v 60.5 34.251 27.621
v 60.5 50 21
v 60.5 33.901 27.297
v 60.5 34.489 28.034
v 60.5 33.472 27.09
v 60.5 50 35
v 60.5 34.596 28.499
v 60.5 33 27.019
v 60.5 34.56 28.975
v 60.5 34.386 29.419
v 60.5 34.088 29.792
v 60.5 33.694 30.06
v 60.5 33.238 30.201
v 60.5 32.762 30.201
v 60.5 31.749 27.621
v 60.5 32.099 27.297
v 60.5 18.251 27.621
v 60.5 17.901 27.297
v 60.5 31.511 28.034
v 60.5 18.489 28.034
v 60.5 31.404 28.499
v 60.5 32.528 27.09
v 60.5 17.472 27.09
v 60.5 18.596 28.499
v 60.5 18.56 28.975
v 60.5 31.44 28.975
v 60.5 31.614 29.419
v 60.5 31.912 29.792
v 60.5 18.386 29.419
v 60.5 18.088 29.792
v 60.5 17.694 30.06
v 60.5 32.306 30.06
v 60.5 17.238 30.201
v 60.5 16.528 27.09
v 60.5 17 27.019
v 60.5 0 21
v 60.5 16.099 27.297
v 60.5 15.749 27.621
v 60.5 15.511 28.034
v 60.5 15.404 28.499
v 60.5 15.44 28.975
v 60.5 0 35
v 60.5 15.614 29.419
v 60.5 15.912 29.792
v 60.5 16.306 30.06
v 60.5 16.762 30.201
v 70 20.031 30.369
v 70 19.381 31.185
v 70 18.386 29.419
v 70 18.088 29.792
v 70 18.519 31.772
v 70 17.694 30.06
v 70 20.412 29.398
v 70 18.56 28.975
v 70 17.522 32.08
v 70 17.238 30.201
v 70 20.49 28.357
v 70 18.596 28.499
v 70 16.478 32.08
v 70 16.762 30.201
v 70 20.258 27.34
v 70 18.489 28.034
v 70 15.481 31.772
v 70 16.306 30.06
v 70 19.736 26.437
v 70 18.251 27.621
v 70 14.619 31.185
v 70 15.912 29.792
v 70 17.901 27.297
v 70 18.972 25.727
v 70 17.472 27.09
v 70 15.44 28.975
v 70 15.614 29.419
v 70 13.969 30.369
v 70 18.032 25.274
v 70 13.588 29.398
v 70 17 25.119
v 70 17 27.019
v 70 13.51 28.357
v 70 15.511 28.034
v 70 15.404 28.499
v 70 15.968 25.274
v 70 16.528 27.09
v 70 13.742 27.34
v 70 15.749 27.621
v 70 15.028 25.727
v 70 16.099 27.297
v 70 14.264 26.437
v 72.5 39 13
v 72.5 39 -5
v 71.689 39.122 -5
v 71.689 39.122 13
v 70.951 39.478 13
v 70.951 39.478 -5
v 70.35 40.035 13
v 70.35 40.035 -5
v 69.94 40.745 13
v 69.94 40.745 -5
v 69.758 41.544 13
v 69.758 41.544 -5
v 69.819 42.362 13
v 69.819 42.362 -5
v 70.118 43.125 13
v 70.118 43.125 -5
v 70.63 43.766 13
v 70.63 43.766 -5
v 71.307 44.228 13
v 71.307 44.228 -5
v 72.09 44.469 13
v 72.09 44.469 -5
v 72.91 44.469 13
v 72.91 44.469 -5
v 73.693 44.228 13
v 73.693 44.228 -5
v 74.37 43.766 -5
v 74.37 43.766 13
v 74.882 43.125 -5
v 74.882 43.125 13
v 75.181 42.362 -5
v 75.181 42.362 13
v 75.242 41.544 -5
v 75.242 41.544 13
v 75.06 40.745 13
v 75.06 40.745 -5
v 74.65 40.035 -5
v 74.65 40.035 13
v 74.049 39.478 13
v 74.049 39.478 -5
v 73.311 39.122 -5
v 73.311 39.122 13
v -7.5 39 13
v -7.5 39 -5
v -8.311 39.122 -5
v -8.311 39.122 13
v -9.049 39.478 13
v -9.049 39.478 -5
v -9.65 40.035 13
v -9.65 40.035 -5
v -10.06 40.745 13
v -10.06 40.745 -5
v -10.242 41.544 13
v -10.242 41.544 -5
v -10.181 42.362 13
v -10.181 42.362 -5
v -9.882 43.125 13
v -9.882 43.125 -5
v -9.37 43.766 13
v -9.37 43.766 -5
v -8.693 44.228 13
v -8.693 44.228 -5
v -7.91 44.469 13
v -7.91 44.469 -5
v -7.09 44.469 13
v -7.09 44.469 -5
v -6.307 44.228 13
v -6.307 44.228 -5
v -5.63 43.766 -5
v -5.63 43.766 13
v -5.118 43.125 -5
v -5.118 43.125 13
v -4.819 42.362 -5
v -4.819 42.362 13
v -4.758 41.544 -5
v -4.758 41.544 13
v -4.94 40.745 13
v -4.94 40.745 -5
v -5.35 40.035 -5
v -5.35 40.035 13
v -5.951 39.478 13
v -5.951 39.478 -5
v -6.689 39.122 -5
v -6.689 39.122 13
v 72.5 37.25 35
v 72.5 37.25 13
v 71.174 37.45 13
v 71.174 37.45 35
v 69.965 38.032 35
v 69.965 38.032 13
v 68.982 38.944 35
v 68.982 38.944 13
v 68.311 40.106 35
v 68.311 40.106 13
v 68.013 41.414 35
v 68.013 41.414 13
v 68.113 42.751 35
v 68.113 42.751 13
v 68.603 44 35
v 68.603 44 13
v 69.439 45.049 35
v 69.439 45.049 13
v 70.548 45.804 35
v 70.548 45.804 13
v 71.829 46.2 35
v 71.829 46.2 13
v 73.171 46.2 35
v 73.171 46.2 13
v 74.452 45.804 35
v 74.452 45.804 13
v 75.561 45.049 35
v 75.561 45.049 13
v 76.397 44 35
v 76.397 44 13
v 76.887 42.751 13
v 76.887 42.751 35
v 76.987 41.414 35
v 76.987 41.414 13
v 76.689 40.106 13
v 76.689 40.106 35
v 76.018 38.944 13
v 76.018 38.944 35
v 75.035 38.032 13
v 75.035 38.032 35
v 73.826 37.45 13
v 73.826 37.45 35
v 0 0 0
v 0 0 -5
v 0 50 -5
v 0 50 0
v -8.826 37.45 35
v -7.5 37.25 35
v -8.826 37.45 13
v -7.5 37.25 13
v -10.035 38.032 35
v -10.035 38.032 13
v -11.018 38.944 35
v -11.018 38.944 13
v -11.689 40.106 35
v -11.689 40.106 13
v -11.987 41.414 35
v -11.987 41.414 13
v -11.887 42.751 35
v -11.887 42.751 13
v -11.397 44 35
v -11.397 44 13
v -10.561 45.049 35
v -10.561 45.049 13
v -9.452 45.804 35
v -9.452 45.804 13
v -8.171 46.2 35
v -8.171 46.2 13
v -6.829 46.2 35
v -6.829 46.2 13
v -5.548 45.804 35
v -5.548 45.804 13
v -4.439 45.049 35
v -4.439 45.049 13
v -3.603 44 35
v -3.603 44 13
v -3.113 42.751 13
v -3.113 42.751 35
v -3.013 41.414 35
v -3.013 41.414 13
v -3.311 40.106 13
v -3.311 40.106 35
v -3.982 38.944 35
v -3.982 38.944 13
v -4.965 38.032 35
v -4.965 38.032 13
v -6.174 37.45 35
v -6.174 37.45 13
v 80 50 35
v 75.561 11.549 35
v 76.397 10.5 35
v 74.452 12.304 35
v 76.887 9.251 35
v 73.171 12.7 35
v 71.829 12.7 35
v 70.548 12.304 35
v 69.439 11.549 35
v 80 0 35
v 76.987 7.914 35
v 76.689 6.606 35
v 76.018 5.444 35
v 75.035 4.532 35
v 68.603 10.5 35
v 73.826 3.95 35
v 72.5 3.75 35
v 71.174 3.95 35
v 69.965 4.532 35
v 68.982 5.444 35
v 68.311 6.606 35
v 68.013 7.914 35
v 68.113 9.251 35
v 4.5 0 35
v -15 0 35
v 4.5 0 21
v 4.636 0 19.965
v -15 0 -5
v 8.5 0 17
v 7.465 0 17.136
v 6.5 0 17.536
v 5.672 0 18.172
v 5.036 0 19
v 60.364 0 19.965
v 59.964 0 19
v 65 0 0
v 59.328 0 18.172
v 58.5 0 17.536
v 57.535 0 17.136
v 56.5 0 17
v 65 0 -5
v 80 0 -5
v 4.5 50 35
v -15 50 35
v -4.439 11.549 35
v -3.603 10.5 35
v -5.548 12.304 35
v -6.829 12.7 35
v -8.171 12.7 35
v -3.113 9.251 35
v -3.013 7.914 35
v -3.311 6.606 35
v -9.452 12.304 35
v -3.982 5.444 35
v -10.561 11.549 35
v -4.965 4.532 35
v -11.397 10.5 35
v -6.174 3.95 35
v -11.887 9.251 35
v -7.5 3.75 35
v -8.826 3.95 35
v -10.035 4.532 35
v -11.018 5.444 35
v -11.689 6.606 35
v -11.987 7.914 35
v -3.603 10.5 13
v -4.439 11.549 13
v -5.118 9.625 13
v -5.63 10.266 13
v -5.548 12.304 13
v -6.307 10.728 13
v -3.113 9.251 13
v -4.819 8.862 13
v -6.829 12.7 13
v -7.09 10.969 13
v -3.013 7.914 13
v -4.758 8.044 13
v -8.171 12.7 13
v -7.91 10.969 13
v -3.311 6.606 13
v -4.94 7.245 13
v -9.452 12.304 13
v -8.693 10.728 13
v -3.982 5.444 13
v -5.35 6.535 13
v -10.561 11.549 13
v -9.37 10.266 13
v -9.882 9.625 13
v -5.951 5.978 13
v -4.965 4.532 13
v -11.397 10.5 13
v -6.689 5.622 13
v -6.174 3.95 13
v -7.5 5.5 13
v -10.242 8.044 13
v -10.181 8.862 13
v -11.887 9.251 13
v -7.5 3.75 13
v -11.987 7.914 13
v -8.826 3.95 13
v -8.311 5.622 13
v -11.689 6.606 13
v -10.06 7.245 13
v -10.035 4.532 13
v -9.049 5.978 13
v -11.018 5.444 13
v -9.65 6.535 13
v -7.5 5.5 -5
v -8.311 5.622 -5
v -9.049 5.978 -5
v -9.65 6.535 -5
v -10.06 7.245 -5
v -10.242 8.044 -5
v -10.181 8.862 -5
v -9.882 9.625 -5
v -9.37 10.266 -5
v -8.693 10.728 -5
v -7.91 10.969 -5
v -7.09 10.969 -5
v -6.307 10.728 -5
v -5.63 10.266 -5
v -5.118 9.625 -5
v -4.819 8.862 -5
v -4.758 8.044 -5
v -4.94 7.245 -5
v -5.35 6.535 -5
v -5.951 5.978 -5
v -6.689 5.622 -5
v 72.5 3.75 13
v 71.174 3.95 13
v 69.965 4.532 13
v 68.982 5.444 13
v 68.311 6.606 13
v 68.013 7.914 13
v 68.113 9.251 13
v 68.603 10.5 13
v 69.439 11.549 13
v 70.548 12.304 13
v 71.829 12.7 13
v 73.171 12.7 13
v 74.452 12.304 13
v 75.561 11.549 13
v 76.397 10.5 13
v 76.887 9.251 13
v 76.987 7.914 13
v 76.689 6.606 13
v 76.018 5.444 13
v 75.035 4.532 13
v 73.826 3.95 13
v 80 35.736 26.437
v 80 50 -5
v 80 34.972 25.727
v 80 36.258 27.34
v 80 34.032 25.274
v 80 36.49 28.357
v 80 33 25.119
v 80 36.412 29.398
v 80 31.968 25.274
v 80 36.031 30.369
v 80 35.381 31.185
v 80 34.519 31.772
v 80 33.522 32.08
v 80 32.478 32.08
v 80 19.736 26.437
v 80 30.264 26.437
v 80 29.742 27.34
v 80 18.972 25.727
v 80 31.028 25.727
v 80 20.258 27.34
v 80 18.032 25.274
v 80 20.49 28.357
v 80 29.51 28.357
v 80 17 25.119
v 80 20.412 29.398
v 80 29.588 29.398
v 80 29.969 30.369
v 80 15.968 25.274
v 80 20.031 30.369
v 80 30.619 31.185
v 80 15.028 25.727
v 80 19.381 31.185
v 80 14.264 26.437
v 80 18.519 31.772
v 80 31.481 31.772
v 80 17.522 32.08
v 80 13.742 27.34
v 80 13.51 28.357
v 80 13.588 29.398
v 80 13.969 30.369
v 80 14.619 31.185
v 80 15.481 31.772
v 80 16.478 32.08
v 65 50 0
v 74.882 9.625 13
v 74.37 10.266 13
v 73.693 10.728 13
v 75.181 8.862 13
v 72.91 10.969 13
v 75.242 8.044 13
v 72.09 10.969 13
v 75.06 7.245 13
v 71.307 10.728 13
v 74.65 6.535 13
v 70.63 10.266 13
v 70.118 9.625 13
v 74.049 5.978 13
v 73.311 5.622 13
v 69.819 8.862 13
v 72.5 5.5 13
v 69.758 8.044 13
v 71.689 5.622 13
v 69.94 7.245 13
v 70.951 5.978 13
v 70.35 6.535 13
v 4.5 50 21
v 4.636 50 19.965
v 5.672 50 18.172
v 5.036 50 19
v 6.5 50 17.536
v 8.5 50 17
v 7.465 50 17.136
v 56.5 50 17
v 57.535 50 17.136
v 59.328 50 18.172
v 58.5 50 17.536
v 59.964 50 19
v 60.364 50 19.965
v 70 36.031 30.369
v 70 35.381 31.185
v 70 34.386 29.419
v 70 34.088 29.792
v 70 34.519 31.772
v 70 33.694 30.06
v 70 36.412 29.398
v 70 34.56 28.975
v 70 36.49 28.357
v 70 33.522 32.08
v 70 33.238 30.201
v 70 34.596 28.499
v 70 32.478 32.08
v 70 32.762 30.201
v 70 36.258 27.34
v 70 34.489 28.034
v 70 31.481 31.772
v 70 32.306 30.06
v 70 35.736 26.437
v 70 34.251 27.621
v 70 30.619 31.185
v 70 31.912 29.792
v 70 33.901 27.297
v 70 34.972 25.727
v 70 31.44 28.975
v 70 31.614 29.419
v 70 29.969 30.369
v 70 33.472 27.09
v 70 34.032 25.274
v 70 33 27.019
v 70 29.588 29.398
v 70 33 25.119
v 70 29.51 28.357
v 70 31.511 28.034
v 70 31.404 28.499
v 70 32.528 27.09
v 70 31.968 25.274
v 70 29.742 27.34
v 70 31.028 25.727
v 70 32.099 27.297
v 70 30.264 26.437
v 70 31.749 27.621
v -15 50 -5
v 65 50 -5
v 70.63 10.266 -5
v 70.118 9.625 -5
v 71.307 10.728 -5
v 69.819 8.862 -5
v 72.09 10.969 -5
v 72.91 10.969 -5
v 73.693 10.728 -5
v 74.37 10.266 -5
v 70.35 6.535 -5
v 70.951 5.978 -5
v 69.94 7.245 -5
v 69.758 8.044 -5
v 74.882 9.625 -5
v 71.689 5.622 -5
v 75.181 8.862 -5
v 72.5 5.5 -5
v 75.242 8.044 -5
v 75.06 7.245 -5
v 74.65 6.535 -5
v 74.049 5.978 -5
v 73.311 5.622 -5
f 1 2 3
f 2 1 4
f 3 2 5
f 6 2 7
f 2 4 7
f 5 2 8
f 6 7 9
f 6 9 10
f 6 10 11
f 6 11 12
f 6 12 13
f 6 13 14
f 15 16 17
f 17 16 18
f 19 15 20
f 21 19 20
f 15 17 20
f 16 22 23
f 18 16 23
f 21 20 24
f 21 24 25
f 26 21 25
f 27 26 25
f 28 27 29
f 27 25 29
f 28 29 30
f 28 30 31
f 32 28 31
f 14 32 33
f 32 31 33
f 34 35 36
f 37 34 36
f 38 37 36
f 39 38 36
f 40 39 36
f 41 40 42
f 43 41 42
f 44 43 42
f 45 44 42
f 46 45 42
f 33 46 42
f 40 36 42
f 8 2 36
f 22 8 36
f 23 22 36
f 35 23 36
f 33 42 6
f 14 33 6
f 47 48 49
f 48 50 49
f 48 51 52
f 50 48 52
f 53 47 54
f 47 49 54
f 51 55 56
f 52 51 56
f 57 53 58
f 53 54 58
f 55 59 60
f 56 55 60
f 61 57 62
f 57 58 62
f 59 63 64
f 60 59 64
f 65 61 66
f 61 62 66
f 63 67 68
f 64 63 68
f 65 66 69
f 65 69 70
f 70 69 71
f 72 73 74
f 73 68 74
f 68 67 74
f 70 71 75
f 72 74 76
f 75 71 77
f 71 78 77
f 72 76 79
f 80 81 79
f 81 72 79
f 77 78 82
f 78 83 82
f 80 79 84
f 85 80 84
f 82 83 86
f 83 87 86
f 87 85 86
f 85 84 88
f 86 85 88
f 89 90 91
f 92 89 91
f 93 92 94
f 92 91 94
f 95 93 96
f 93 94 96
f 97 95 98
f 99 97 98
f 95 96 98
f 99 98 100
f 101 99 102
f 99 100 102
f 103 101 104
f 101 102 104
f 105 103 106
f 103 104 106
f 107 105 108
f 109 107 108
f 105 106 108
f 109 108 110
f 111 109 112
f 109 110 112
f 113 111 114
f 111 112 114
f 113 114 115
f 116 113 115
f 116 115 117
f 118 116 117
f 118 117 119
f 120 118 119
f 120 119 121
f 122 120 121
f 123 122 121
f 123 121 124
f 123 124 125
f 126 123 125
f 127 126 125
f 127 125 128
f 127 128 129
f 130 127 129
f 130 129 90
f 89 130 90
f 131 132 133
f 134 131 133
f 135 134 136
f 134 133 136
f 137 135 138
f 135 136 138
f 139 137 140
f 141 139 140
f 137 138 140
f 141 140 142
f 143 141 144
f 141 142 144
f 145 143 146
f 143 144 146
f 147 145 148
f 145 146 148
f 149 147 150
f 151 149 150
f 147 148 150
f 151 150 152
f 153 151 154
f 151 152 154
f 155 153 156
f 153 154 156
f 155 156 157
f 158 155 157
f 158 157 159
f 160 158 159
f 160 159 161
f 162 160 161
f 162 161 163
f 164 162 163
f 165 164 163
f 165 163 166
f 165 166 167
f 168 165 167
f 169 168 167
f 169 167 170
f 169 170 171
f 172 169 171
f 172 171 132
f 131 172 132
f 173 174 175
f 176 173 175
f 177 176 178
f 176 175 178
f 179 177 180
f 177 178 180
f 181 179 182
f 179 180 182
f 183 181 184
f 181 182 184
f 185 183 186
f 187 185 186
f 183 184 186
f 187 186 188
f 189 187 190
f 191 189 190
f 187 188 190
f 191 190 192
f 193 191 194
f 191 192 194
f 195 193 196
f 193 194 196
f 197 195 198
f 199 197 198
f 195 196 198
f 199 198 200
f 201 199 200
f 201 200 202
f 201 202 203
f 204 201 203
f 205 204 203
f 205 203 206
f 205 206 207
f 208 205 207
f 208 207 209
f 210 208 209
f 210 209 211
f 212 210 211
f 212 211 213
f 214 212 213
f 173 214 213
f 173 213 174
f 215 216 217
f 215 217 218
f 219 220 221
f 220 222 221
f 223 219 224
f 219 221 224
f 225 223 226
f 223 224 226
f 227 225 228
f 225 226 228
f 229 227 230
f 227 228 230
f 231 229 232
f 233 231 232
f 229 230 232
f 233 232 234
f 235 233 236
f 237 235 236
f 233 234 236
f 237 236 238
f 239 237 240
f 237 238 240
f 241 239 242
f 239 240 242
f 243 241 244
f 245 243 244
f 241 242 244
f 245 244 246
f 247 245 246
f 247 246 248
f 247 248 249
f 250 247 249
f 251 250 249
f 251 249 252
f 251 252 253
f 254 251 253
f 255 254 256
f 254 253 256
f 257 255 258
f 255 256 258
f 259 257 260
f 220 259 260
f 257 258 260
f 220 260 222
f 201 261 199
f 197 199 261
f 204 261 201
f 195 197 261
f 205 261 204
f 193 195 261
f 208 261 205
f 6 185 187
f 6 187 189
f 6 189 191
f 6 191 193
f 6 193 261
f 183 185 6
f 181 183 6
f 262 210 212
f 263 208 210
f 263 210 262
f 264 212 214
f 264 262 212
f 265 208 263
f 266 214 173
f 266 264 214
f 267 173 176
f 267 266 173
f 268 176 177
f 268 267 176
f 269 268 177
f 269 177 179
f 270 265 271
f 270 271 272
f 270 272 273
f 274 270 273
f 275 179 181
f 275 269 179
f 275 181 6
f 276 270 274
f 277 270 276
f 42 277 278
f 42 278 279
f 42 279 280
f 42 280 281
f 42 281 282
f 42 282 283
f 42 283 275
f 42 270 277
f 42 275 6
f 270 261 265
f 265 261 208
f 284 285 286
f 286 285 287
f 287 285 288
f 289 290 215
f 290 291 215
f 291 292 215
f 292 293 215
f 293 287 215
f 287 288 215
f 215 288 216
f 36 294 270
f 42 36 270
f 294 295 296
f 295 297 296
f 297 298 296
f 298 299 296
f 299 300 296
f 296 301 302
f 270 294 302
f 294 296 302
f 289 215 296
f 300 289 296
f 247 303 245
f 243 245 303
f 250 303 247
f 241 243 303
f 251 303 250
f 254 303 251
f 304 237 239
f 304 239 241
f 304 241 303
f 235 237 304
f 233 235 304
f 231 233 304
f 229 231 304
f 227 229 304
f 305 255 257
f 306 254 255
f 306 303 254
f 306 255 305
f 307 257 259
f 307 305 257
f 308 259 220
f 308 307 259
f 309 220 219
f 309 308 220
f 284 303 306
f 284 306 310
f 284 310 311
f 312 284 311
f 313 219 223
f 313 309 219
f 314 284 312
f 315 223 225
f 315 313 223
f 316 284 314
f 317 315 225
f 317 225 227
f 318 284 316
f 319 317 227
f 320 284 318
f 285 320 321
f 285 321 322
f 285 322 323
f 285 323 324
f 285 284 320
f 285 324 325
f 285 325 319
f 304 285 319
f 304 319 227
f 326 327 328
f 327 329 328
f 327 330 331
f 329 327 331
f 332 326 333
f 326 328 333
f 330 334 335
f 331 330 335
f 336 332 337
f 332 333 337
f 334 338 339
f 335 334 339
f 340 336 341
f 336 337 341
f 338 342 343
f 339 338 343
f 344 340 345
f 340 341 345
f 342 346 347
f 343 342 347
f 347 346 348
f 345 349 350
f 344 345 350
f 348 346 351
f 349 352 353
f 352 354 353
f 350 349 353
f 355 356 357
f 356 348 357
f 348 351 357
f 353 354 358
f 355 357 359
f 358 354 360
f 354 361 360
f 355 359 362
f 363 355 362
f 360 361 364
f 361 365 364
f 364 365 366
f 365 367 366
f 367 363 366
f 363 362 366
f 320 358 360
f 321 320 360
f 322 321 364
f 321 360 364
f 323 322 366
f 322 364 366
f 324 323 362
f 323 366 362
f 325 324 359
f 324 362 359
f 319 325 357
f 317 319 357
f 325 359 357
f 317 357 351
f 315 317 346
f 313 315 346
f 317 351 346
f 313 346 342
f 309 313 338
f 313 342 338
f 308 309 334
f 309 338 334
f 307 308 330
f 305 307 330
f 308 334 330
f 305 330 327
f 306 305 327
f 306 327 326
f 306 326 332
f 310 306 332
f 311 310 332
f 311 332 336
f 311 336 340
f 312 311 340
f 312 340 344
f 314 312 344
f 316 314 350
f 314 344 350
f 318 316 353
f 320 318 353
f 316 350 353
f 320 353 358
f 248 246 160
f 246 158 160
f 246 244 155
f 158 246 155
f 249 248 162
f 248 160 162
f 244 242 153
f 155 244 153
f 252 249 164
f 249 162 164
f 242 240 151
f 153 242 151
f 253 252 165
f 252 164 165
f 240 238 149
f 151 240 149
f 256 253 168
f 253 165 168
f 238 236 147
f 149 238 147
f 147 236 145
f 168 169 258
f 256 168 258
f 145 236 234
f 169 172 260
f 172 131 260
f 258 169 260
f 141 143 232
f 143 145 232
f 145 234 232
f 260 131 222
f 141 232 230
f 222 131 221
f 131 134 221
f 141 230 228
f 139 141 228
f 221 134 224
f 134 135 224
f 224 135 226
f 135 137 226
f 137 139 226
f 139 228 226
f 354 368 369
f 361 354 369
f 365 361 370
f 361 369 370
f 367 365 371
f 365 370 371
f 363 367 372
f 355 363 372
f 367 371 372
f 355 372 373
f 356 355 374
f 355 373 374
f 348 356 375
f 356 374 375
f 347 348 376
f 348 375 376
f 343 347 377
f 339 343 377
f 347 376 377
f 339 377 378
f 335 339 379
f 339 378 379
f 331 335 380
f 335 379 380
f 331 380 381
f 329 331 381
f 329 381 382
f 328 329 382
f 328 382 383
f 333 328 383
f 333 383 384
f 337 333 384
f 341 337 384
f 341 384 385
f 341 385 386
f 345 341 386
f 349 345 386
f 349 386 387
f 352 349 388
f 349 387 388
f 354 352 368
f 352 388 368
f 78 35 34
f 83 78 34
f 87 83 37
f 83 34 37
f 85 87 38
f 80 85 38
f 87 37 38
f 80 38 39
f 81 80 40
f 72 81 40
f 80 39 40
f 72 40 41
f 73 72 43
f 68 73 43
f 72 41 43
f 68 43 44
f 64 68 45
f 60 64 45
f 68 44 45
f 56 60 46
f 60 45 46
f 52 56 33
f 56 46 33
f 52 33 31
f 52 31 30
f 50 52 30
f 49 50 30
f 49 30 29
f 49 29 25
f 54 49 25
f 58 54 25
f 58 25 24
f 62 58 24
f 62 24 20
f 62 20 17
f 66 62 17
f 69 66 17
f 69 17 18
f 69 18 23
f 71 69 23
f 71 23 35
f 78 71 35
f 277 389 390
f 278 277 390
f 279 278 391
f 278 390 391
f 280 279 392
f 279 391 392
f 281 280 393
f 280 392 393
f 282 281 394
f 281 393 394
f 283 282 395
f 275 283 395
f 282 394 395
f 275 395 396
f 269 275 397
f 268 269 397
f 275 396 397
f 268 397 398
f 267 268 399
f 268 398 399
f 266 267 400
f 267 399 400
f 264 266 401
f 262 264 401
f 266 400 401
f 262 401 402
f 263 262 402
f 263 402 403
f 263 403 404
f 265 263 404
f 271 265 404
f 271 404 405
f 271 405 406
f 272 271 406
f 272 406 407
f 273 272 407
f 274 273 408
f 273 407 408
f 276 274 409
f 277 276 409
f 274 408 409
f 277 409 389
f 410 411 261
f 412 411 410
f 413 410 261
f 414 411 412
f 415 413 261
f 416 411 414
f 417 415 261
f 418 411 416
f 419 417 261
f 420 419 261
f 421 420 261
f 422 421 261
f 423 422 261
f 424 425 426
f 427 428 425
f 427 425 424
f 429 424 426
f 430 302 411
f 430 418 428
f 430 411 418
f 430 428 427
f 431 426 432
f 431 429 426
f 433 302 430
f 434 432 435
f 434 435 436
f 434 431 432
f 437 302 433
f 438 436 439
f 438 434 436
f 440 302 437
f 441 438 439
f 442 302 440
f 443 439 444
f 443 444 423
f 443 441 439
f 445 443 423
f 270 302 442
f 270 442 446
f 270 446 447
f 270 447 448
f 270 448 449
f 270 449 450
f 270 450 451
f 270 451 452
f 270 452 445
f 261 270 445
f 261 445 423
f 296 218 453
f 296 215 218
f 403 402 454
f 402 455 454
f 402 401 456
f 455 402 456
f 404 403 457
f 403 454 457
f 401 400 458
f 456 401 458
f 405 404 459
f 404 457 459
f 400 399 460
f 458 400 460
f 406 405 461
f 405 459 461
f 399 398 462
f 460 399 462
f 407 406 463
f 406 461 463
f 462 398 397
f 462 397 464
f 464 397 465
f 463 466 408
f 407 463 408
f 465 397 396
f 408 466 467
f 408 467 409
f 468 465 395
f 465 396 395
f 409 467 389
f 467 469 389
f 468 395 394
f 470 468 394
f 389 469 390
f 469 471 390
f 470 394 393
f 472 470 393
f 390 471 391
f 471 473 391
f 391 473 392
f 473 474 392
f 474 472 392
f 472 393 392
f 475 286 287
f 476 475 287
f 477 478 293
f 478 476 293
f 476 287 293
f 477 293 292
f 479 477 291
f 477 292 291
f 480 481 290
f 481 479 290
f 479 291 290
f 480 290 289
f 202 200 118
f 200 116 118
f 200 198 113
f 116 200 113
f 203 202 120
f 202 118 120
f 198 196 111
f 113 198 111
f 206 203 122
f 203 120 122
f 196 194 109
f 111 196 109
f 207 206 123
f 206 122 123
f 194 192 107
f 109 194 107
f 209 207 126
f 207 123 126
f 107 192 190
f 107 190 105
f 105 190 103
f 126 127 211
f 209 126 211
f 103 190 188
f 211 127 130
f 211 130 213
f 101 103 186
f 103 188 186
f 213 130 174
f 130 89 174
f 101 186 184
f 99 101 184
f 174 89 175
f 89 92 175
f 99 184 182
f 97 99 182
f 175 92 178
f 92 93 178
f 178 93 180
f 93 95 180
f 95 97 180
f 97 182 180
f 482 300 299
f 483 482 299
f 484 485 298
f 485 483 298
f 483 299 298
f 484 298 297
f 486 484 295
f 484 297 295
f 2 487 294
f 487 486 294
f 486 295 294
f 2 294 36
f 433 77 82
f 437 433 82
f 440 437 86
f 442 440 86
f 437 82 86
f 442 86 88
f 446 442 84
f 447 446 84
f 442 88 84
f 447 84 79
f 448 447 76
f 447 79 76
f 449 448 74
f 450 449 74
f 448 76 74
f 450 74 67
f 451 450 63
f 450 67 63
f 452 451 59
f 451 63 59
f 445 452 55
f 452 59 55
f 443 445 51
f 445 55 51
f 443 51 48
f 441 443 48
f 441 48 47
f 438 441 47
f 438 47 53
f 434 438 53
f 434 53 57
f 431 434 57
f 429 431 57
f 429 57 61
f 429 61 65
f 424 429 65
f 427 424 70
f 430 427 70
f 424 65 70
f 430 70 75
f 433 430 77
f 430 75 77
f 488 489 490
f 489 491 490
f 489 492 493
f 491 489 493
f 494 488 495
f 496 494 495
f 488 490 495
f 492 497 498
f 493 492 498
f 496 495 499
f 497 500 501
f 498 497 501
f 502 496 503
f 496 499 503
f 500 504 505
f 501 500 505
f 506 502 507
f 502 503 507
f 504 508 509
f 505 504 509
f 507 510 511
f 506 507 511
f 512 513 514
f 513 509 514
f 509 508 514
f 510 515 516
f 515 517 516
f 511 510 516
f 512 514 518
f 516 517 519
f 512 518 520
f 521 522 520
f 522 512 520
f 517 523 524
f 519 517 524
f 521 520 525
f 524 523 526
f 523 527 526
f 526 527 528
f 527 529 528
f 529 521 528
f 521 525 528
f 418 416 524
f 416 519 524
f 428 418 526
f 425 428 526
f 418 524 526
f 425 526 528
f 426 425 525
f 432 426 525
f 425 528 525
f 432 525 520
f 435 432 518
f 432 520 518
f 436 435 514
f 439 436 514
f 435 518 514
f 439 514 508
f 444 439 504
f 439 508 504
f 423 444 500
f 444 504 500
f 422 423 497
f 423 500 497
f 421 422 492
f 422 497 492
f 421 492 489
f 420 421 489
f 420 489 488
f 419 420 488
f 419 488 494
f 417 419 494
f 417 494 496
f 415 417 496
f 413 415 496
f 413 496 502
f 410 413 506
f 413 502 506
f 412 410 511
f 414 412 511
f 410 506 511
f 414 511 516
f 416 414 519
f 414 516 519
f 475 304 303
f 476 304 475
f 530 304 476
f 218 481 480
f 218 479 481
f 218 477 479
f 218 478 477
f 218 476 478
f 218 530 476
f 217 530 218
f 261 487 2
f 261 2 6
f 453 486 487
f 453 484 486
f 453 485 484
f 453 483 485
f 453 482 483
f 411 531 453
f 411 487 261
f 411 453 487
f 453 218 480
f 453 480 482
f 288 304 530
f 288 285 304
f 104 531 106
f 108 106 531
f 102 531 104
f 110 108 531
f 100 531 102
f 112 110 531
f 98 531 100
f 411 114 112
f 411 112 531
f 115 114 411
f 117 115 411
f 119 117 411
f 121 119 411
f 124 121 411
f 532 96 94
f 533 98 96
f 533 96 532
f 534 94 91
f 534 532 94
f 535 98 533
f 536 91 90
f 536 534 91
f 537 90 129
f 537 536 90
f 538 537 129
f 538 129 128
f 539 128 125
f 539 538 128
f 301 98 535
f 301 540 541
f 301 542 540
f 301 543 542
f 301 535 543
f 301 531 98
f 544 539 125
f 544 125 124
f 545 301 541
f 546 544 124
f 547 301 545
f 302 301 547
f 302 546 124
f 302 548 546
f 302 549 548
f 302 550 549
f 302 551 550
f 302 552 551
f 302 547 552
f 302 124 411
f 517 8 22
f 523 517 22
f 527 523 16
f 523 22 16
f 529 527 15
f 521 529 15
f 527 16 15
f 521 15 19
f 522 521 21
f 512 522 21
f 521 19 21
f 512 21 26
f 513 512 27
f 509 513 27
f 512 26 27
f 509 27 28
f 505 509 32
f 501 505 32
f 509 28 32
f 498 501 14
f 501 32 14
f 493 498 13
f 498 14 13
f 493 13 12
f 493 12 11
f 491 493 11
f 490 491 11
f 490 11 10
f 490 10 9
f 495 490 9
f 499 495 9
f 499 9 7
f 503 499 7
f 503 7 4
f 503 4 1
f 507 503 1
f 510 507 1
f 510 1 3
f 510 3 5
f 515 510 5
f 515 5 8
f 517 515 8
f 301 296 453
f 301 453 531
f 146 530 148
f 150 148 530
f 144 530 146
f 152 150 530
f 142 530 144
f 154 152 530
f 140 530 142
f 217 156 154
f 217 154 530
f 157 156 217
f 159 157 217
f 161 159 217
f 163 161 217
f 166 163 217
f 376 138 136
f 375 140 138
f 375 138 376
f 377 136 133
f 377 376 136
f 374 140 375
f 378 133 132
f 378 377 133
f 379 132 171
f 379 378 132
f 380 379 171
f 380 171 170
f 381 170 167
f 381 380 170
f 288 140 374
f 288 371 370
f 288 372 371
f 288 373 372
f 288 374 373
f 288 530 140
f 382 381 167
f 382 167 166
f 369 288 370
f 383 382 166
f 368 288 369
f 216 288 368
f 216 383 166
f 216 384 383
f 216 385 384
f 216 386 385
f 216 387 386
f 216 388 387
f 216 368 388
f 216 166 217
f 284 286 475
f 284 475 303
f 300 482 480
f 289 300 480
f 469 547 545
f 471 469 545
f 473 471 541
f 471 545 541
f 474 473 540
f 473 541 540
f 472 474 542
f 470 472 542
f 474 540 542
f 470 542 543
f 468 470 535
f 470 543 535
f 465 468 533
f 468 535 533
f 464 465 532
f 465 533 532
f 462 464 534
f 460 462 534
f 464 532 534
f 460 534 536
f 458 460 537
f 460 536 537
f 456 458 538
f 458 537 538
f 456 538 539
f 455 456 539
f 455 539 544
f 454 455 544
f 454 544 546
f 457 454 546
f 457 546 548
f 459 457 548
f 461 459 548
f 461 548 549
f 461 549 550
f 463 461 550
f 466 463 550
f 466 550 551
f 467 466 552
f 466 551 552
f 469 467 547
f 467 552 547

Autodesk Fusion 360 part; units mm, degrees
sketch "Sketch1" plane through (0, 0, 0) normal (0, 1, 0) x (1, 0, 0)
  line L0 (0, 0) -> (65, 0)
  line L1 (65, 0) -> (65, 5)
  line L2 (65, 5) -> (80, 5)
  line L3 (80, 5) -> (80, -35)
  line L4 (80, -35) -> (0, -35)
  line L5 (0, -35) -> (-15, -35)
  line L6 (-15, -35) -> (-15, 5)
  line L7 (-15, 5) -> (0, 5)
  line L8 (0, 5) -> (0, 0)
  line L9 (32.5, 0) -> (32.5, -35) construction
  line L10 (32.5, 0) -> (4.5, 0) construction
  line L11 (32.5, 0) -> (60.5, 0) construction
  line L12 (60.5, 0) -> (60.5, -17) construction
  line L13 (56.5, -17) -> (8.5, -17)
  line L14 (4.5, -21) -> (4.5, -35)
  line L15 (60.5, -21) -> (60.5, -35)
  arc A0 (8.5, -17) -> (4.5, -21) centre (8.5, -21) ccw
  arc A1 (60.5, -21) -> (56.5, -17) centre (56.5, -21) ccw
  point P0 (4.5, -17)
  dimension "d1" = 65
  dimension "d2" = 28
  dimension "d3" = 28
  dimension "d4" = 17
  dimension "d5" = 56
  dimension "d6" = 4
  dimension "d7" = 4
extrude "Extrude1" add sketch "Sketch1" along normal blind 50 contours L0 L1 L2 L3 L4 L5 L6 L7 L8 L13 L14 L15 A0 A1
sketch "Sketch2" plane through (0, 0, 35) normal (0, 0, 1) x (1, 0, 0)
  line L0 (-15, 0) -> (4.5, 0)
  line L1 (4.5, 0) -> (4.5, 50)
  line L2 (4.5, 50) -> (-15, 50)
  line L3 (-15, 50) -> (-15, 0)
  line L4 (-15, 25) -> (80, 25) construction
  line L5 (32.5, 0.0866) -> (32.5, 50) construction
  line L6 (32.5, 25) -> (72.5, 25) construction
  line L7 (72.5, 25) -> (72.5, 41.75) construction
  line L8 (72.5, 25) -> (72.5, 8.25) construction
  line L9 (72.5, 41.75) -> (-7.5, 41.75) construction
  line L10 (72.5, 8.25) -> (-7.5, 8.25) construction
  point P0 (-7.5, 41.75)
  point P1 (72.5, 41.75)
  point P2 (72.5, 8.25)
  point P3 (-7.5, 8.25)
  dimension "d10" = 40
  dimension "d11" = 16.75
  dimension "d12" = 16.75
  dimension "d13" = 80
  dimension "d14" = 80
hole "Hole1" at (-7.5, 41.75, 35) at (72.5, 41.75, 35) at (72.5, 8.25, 35) at (-7.5, 8.25, 35) direction (0, 0, -1) diameter 5.5 depth 40 tip angle 118 counterbore diameter 9 counterbore depth 22
sketch "Sketch3" plane through (80, 0, 0) normal (1, 0, 0) x (0, 0, -1)
  line L0 (-35, 0) -> (5, 0)
  line L1 (5, 0) -> (5, 50)
  line L2 (5, 50) -> (-35, 50)
  line L3 (-35, 50) -> (-35, 0)
  line L4 (5, 25) -> (-35, 25) construction
  line L5 (-28.6189, 25) -> (-28.6189, 33) construction
  line L6 (-28.6189, 33) -> (-28.6189, 17) construction
  point P0 (-28.6189, 33)
  point P1 (-28.6189, 17)
hole "Hole2" at (80, 17, 28.6189) at (80, 33, 28.6189) direction (-1, 0, 0) diameter 3.2 depth 40 tip angle 118 counterbore diameter 7 counterbore depth 10
